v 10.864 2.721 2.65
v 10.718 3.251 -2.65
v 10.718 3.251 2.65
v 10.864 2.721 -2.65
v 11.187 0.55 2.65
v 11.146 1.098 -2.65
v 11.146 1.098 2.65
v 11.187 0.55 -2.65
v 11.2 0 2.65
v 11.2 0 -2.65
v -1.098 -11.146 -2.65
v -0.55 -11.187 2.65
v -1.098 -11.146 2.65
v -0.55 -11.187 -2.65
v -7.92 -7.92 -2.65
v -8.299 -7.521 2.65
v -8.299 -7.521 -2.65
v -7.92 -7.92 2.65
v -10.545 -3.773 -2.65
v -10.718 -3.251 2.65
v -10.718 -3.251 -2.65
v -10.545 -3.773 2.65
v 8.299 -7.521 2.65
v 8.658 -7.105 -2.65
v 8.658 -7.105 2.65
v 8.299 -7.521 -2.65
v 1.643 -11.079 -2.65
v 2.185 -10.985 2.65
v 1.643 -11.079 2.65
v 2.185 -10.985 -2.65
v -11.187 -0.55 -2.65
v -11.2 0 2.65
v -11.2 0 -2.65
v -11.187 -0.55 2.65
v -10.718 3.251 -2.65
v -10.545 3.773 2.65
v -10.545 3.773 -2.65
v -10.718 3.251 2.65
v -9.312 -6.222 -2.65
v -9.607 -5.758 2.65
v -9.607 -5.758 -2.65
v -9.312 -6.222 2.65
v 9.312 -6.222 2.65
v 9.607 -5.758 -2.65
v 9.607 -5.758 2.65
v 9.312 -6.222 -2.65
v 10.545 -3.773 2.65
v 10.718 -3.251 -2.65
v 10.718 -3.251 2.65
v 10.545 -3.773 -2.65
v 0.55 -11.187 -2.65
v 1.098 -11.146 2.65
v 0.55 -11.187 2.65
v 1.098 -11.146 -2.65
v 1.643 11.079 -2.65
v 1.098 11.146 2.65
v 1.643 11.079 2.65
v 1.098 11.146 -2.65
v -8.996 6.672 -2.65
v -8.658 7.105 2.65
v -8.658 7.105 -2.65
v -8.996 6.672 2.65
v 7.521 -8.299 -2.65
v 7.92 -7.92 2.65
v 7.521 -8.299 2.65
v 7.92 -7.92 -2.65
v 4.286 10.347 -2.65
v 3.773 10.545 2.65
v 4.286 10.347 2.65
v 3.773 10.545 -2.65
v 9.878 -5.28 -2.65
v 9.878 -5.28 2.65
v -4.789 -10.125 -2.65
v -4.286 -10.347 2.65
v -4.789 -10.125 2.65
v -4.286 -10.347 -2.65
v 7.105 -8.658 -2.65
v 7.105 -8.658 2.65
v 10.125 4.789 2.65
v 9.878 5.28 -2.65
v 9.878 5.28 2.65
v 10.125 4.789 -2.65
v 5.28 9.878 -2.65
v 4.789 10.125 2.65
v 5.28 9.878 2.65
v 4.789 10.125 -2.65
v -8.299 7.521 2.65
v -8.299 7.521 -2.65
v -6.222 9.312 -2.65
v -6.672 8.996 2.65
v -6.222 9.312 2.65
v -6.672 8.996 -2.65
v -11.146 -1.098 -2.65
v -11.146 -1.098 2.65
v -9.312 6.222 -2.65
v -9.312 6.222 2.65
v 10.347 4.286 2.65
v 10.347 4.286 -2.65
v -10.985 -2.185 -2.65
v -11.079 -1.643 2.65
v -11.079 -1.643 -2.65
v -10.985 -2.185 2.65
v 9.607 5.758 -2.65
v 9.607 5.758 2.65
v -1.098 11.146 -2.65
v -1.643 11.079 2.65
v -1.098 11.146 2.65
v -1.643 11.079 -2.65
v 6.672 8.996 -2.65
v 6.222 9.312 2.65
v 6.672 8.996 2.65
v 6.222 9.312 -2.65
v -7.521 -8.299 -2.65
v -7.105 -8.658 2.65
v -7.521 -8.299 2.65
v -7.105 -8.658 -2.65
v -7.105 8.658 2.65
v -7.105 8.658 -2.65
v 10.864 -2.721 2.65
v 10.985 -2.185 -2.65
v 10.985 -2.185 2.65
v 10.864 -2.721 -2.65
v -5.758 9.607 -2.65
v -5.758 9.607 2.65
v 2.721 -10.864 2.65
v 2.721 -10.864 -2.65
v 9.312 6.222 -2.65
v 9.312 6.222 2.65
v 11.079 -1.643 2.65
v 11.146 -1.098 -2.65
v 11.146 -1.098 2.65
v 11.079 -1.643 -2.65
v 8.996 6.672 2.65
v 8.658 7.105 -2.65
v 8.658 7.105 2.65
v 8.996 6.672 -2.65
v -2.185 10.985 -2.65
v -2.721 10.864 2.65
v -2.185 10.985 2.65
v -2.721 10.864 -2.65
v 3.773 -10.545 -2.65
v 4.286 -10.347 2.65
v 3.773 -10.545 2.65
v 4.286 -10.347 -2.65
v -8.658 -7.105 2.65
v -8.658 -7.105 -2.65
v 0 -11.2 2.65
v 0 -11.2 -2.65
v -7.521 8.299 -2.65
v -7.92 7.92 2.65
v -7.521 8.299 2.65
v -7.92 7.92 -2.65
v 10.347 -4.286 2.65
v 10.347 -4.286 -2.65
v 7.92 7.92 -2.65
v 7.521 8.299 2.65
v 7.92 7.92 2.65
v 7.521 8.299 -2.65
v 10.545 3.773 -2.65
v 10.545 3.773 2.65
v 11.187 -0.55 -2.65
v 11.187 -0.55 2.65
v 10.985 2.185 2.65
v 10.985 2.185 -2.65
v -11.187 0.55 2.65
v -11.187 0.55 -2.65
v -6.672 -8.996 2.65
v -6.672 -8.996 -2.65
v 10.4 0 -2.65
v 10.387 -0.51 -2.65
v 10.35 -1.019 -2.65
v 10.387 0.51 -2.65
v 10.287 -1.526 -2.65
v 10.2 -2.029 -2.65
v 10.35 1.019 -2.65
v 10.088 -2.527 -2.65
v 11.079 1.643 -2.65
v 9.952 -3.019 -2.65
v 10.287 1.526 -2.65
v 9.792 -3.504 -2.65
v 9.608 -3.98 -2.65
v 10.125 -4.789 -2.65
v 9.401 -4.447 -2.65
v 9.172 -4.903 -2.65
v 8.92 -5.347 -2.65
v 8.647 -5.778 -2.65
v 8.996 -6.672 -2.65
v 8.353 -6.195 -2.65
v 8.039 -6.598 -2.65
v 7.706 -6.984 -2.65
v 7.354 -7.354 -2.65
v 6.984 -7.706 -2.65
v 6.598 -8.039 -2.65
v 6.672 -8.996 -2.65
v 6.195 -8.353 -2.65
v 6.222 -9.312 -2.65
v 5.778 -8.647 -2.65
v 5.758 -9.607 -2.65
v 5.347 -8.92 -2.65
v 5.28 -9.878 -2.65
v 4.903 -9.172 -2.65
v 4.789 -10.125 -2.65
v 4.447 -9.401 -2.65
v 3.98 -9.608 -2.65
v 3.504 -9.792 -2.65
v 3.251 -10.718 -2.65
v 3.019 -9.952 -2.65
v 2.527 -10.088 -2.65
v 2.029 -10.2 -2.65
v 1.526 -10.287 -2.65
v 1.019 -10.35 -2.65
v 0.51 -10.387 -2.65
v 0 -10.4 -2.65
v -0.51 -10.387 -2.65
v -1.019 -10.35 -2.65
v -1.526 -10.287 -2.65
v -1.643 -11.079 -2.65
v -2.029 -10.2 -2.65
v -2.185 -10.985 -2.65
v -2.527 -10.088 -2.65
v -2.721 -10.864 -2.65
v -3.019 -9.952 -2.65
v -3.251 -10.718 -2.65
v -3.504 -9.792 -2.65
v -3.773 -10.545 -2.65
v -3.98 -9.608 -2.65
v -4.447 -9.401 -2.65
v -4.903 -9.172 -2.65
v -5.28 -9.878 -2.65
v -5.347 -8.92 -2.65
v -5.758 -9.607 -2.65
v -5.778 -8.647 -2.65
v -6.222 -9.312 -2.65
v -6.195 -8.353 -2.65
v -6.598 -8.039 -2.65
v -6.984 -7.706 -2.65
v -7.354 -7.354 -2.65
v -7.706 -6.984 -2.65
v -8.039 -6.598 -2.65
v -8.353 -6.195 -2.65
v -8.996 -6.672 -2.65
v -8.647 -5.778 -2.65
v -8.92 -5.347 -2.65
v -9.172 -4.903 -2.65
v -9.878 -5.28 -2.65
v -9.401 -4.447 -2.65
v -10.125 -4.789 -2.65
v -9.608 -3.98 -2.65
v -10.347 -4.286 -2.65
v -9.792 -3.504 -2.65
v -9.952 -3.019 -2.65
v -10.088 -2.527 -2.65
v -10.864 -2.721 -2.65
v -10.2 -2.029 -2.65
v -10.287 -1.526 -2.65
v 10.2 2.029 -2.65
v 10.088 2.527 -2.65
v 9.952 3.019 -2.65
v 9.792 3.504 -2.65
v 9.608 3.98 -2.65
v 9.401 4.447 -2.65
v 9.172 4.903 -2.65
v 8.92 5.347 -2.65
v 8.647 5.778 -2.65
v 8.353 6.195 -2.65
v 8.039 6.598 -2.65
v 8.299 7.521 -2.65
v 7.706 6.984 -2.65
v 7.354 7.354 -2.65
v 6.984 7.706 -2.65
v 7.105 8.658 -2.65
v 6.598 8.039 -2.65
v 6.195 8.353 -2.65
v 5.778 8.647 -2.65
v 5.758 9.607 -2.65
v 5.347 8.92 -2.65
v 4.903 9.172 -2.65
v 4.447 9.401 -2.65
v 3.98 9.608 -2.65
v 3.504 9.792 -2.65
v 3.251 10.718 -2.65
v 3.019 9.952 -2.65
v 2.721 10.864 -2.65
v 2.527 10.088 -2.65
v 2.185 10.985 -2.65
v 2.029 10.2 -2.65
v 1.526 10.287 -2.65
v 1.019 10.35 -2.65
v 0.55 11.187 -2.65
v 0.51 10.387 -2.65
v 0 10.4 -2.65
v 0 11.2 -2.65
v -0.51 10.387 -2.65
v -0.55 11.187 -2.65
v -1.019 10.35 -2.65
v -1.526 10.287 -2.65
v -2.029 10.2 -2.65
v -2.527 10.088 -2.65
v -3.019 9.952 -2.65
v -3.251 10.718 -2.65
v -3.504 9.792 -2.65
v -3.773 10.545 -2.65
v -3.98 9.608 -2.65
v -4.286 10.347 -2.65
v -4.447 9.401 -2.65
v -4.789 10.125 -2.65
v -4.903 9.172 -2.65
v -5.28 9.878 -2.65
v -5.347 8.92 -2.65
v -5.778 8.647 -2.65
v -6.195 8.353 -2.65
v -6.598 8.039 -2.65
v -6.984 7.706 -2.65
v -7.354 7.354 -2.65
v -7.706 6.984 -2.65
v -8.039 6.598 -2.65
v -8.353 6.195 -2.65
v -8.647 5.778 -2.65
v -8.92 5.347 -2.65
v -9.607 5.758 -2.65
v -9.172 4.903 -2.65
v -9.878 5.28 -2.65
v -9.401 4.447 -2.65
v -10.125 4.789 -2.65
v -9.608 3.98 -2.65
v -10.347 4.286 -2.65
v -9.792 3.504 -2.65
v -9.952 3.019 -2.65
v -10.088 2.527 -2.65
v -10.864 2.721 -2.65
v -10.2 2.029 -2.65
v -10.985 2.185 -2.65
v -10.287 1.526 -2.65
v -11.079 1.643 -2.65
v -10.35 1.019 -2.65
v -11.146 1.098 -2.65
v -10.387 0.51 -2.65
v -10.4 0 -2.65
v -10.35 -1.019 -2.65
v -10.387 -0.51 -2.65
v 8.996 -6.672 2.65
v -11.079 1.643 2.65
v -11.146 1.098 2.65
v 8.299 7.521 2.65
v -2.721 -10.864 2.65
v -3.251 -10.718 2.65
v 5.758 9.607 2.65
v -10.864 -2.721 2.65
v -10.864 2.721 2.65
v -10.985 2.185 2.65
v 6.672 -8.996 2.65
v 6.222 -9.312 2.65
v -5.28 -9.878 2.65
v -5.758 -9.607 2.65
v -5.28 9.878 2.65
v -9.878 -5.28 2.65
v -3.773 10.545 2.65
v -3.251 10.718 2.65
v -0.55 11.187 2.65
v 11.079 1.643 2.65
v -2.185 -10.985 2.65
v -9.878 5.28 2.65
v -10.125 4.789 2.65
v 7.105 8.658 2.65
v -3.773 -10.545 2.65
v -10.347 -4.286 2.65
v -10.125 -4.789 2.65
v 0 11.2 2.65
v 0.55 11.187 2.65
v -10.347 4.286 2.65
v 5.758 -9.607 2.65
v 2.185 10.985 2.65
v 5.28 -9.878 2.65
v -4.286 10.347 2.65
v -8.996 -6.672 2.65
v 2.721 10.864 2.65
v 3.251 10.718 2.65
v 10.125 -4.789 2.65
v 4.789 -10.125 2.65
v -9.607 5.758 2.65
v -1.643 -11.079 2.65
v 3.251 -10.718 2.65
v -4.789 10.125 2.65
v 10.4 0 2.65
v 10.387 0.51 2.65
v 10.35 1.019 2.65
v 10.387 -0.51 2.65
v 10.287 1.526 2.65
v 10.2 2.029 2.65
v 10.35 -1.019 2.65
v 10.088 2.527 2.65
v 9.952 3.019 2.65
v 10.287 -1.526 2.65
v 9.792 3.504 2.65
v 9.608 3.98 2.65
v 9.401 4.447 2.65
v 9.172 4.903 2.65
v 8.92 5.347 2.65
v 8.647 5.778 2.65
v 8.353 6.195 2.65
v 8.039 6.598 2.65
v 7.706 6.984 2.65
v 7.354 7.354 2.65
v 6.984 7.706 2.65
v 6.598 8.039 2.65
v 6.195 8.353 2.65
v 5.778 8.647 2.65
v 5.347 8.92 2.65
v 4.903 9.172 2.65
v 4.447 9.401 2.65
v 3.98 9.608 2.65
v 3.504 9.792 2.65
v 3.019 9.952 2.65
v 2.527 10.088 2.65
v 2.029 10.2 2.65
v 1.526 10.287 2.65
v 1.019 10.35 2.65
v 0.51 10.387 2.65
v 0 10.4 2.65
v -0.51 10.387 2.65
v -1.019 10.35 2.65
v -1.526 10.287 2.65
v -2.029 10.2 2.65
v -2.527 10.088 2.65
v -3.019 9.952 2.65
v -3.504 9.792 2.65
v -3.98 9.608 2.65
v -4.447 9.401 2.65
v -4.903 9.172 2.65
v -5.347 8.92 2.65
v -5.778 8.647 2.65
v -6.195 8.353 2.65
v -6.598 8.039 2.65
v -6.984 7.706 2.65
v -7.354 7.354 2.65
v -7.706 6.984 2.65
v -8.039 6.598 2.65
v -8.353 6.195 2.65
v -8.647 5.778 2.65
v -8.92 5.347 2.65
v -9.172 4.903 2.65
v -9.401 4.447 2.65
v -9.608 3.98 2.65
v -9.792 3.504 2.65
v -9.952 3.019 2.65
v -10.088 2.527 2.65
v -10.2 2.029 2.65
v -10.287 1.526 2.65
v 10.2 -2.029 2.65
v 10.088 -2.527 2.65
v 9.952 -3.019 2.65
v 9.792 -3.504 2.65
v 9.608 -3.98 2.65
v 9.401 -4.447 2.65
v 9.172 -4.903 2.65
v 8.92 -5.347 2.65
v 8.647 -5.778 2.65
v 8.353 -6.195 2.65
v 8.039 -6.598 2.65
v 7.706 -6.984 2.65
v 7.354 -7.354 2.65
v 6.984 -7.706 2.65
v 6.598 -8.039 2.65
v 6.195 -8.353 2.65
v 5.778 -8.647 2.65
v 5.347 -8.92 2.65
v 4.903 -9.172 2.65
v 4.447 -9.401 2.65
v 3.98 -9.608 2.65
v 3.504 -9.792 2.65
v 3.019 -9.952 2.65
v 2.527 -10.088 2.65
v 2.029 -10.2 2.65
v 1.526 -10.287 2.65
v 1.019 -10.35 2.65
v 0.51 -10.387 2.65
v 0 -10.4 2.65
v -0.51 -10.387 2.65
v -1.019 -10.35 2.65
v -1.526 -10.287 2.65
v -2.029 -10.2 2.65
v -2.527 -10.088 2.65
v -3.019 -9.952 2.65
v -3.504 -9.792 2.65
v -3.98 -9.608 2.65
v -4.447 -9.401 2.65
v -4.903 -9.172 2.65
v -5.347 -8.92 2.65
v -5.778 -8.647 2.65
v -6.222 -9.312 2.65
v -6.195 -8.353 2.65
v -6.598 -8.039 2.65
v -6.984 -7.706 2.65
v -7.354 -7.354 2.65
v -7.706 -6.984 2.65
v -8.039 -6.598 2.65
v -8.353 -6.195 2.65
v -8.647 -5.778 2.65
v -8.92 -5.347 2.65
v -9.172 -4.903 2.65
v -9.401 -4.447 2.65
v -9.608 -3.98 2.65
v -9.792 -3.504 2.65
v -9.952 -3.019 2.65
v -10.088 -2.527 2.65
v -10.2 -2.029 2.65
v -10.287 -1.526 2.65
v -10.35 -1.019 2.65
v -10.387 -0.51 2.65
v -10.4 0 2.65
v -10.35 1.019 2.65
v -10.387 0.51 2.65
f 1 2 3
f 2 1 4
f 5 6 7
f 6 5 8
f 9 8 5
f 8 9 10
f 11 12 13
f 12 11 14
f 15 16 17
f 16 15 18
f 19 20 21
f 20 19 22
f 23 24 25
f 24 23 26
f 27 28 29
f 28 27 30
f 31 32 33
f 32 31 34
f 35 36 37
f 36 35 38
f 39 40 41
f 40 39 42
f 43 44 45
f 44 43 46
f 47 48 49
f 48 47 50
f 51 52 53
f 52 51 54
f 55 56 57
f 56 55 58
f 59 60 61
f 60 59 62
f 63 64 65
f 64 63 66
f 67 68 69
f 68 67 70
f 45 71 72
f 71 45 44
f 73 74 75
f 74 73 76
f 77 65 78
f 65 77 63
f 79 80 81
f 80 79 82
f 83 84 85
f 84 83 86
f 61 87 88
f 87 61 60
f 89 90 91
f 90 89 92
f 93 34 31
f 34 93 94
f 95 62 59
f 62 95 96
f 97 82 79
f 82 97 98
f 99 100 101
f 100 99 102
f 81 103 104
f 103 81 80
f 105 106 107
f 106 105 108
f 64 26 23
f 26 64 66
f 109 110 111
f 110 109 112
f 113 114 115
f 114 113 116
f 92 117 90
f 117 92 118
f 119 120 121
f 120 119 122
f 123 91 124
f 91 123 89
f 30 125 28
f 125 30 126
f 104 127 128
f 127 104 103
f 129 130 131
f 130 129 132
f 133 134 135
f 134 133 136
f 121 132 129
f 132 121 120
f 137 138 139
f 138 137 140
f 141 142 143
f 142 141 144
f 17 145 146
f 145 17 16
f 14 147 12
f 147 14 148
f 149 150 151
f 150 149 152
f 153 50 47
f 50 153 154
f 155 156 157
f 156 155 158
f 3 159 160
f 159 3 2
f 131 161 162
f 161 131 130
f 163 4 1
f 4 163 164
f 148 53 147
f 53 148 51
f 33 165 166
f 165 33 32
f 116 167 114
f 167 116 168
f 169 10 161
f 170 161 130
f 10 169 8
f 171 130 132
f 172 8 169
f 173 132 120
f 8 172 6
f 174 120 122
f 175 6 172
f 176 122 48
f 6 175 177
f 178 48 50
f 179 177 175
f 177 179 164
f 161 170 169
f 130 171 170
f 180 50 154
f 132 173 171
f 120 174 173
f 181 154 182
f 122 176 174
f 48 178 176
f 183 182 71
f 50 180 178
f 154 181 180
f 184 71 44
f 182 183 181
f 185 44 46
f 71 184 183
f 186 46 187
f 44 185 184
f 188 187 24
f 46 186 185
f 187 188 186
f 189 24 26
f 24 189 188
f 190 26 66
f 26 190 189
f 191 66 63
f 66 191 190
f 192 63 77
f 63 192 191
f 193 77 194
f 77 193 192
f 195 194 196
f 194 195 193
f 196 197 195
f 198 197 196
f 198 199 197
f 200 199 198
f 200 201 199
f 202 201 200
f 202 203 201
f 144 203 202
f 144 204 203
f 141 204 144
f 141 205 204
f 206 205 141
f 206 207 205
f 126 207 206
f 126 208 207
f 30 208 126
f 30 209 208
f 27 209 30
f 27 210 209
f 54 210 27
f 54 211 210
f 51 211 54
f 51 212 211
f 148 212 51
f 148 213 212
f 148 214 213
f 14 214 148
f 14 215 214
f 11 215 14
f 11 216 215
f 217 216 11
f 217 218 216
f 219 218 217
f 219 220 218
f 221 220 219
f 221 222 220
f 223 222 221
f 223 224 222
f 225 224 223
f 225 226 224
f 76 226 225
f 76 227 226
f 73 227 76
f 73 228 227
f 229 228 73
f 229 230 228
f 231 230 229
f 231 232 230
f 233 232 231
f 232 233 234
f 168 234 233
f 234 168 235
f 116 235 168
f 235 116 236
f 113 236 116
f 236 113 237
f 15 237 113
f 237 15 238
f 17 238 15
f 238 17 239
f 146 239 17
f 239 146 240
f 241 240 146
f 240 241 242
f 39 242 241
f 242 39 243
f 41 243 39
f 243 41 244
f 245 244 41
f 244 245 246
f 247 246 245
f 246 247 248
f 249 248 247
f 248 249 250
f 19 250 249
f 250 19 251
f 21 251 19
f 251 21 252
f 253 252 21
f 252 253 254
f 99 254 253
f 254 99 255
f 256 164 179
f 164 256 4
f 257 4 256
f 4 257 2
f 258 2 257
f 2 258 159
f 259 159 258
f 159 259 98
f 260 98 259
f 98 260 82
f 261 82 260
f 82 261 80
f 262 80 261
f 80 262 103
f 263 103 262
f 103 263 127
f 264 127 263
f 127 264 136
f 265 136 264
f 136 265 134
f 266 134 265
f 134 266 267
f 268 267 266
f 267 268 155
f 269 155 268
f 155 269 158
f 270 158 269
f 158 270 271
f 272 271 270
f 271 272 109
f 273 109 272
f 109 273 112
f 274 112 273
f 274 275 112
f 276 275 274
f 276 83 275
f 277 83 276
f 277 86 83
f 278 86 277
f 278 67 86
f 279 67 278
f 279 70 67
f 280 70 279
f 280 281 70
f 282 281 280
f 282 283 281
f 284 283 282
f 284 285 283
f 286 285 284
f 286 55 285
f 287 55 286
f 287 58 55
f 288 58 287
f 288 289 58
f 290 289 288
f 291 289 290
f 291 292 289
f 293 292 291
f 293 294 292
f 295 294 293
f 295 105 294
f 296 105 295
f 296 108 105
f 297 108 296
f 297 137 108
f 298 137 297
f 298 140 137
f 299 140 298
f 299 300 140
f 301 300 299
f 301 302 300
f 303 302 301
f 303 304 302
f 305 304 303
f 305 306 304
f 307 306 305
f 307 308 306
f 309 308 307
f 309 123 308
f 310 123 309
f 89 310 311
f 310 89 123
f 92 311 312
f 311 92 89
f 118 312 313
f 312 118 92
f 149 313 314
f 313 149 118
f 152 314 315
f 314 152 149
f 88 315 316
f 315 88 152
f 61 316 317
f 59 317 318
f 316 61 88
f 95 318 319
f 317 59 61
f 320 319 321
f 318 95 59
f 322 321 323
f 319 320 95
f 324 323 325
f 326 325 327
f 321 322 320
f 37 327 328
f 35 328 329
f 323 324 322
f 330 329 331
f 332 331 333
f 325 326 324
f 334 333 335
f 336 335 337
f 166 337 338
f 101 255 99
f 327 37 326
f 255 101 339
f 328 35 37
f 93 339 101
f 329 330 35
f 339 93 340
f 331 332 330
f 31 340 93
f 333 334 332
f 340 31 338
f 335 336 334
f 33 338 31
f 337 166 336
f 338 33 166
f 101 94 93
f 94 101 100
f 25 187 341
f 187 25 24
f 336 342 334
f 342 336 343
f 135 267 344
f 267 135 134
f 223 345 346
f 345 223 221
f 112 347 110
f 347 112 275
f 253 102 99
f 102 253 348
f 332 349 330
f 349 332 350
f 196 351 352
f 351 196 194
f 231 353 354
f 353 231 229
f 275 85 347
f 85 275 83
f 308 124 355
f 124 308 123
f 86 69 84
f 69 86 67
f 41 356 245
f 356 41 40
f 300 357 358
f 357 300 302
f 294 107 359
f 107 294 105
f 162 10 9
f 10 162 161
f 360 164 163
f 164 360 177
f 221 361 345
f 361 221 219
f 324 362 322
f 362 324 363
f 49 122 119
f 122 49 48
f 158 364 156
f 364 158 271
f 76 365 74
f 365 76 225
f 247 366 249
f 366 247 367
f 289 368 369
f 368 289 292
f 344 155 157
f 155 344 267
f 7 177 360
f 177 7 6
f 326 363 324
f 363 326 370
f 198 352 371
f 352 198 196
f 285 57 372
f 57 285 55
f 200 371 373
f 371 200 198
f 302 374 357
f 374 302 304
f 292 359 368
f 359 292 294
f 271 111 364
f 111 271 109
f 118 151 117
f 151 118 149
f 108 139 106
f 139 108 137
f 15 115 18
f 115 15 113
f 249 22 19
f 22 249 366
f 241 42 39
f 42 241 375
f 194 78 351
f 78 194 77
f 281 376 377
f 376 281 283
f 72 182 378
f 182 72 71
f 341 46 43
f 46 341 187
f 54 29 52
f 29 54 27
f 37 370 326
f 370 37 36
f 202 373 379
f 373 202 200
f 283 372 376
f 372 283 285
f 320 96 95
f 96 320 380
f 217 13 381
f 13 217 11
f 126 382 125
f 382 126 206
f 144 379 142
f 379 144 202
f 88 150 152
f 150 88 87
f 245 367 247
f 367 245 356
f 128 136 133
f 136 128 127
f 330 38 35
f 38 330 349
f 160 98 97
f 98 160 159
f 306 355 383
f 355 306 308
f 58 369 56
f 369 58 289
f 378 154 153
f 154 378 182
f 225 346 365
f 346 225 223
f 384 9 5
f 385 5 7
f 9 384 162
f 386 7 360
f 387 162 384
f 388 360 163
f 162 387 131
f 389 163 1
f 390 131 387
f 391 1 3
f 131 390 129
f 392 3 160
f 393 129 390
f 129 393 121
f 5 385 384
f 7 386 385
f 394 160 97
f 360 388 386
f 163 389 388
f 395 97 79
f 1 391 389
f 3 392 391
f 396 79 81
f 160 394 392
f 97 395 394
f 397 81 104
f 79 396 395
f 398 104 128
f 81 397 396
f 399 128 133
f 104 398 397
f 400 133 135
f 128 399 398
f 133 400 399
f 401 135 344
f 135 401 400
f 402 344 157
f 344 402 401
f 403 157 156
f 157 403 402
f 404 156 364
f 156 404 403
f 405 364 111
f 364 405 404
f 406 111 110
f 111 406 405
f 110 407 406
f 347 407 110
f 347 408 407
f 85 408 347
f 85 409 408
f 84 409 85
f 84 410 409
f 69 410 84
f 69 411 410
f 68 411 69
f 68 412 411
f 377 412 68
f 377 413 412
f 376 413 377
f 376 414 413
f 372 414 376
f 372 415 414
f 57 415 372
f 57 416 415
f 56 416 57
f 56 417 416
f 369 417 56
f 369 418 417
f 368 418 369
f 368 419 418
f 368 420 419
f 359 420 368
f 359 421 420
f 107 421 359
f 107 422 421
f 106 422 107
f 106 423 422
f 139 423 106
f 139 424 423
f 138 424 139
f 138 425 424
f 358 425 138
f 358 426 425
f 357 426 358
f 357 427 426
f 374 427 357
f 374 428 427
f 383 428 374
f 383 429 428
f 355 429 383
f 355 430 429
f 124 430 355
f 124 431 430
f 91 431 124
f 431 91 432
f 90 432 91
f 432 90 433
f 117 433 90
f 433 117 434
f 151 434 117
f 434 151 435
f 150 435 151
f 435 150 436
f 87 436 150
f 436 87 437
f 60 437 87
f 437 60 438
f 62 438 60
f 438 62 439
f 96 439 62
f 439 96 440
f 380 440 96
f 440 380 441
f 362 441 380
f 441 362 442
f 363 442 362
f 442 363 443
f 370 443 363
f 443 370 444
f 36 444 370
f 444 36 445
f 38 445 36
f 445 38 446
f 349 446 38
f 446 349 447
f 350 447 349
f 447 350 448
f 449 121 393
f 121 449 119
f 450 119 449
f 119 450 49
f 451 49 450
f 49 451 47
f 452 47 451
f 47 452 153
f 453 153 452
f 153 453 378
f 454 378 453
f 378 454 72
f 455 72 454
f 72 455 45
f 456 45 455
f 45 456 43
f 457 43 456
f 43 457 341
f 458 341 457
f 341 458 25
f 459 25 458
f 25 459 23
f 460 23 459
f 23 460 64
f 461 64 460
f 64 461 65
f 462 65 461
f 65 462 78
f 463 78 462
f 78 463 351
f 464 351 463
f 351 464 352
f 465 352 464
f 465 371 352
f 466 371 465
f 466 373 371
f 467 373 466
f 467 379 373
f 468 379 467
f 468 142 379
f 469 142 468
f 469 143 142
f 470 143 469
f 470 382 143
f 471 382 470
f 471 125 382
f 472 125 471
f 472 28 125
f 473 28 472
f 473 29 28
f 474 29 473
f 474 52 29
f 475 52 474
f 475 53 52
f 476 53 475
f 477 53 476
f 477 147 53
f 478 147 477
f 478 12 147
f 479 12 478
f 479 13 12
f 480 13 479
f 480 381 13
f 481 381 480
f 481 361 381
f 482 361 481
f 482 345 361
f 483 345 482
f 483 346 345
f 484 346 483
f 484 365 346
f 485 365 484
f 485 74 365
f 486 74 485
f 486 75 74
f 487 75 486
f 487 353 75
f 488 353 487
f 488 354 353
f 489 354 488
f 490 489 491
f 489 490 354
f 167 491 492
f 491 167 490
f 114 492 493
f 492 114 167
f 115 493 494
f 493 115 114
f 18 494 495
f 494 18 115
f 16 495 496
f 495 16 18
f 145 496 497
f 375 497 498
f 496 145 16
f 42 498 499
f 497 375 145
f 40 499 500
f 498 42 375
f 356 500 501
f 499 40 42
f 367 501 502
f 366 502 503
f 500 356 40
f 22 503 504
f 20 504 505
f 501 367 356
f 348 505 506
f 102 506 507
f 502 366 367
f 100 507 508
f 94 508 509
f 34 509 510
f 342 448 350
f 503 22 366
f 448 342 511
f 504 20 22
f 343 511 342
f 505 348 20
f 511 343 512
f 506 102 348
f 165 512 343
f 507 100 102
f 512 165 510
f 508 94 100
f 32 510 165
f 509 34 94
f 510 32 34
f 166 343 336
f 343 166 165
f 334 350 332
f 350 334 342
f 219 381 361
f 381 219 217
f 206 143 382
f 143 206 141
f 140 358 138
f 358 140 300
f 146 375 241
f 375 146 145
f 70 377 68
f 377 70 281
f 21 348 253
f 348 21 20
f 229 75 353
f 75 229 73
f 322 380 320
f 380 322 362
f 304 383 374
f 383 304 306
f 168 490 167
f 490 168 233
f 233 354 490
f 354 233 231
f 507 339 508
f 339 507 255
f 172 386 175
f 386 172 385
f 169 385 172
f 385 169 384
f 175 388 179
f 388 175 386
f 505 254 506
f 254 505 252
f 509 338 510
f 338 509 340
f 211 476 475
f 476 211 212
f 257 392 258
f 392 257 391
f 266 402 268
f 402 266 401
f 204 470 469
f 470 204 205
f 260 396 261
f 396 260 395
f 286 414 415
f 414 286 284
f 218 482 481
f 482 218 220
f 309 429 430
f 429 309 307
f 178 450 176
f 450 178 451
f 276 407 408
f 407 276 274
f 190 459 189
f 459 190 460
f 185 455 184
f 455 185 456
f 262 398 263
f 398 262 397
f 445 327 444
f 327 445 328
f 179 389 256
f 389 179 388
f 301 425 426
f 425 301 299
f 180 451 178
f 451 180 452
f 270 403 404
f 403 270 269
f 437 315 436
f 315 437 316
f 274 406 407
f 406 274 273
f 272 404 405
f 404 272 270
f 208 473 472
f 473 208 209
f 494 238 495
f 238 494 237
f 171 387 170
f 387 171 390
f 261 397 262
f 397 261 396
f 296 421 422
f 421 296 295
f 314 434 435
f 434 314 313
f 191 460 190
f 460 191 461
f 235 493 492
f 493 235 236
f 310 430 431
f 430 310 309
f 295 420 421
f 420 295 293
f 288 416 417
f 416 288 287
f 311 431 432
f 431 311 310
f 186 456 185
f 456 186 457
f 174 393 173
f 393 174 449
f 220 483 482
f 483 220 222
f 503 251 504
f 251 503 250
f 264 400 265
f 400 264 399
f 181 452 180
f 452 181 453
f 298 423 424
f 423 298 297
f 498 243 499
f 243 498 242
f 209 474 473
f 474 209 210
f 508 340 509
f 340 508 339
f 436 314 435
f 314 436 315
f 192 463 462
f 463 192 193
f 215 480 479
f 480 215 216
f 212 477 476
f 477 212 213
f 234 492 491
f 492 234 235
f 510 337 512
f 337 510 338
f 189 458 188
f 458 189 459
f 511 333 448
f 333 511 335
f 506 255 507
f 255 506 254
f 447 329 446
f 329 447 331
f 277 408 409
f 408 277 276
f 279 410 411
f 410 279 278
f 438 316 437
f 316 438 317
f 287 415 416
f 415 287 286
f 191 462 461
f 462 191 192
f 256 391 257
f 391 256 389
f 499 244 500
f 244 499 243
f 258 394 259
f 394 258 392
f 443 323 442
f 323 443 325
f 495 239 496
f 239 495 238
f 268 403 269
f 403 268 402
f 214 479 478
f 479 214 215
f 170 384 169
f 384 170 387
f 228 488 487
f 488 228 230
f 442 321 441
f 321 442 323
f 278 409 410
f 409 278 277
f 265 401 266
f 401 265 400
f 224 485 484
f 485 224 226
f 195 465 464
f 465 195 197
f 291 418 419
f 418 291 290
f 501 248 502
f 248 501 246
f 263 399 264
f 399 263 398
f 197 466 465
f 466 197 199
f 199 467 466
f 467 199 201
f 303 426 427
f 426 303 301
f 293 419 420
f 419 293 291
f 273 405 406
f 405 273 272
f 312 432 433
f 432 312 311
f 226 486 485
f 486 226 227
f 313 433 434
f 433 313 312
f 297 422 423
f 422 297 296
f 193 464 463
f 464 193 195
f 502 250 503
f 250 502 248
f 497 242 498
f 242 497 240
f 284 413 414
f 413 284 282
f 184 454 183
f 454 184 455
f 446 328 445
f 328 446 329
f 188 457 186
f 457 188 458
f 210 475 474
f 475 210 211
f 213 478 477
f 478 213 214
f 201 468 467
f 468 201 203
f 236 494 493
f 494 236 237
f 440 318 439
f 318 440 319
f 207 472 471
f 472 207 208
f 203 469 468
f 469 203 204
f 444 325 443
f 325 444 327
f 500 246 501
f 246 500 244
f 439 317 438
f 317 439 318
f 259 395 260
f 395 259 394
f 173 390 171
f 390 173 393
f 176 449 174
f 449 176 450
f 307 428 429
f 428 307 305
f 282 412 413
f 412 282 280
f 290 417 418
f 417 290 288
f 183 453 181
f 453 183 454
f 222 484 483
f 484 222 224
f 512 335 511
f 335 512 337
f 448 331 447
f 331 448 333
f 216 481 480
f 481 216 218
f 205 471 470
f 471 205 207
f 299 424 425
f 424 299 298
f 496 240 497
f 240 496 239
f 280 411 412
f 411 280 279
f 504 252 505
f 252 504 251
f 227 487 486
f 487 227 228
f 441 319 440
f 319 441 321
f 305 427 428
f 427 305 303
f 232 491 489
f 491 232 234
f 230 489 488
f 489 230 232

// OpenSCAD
// Parameters (A radial: [10.8, 10.8, 5.3, 1])
outer_radius = 10.8; //[5.4:21.6:0.1]
inner_radius = 10.8; //[5.4:21.6:0.1]
height       = 5.3;  //[2.65:10.6:0.1]
n            = 1;    //[1:20:1]

// Robustness / connectivity
eps = 0.02;

// Ensure a single connected solid even when outer_radius == inner_radius
ring_thickness = max(0.8, abs(outer_radius - inner_radius));
r_out = max(outer_radius, inner_radius) + ring_thickness/2;
r_in  = max(0, min(outer_radius, inner_radius) - ring_thickness/2);

// Geometry: solid ring (washer)
module radial_body() {
    difference() {
        cylinder(h=height, r=r_out, center=true, $fn=128);
        cylinder(h=height + 2*eps, r=r_in, center=true, $fn=128);
    }
}

// Final Output
radial_body();
